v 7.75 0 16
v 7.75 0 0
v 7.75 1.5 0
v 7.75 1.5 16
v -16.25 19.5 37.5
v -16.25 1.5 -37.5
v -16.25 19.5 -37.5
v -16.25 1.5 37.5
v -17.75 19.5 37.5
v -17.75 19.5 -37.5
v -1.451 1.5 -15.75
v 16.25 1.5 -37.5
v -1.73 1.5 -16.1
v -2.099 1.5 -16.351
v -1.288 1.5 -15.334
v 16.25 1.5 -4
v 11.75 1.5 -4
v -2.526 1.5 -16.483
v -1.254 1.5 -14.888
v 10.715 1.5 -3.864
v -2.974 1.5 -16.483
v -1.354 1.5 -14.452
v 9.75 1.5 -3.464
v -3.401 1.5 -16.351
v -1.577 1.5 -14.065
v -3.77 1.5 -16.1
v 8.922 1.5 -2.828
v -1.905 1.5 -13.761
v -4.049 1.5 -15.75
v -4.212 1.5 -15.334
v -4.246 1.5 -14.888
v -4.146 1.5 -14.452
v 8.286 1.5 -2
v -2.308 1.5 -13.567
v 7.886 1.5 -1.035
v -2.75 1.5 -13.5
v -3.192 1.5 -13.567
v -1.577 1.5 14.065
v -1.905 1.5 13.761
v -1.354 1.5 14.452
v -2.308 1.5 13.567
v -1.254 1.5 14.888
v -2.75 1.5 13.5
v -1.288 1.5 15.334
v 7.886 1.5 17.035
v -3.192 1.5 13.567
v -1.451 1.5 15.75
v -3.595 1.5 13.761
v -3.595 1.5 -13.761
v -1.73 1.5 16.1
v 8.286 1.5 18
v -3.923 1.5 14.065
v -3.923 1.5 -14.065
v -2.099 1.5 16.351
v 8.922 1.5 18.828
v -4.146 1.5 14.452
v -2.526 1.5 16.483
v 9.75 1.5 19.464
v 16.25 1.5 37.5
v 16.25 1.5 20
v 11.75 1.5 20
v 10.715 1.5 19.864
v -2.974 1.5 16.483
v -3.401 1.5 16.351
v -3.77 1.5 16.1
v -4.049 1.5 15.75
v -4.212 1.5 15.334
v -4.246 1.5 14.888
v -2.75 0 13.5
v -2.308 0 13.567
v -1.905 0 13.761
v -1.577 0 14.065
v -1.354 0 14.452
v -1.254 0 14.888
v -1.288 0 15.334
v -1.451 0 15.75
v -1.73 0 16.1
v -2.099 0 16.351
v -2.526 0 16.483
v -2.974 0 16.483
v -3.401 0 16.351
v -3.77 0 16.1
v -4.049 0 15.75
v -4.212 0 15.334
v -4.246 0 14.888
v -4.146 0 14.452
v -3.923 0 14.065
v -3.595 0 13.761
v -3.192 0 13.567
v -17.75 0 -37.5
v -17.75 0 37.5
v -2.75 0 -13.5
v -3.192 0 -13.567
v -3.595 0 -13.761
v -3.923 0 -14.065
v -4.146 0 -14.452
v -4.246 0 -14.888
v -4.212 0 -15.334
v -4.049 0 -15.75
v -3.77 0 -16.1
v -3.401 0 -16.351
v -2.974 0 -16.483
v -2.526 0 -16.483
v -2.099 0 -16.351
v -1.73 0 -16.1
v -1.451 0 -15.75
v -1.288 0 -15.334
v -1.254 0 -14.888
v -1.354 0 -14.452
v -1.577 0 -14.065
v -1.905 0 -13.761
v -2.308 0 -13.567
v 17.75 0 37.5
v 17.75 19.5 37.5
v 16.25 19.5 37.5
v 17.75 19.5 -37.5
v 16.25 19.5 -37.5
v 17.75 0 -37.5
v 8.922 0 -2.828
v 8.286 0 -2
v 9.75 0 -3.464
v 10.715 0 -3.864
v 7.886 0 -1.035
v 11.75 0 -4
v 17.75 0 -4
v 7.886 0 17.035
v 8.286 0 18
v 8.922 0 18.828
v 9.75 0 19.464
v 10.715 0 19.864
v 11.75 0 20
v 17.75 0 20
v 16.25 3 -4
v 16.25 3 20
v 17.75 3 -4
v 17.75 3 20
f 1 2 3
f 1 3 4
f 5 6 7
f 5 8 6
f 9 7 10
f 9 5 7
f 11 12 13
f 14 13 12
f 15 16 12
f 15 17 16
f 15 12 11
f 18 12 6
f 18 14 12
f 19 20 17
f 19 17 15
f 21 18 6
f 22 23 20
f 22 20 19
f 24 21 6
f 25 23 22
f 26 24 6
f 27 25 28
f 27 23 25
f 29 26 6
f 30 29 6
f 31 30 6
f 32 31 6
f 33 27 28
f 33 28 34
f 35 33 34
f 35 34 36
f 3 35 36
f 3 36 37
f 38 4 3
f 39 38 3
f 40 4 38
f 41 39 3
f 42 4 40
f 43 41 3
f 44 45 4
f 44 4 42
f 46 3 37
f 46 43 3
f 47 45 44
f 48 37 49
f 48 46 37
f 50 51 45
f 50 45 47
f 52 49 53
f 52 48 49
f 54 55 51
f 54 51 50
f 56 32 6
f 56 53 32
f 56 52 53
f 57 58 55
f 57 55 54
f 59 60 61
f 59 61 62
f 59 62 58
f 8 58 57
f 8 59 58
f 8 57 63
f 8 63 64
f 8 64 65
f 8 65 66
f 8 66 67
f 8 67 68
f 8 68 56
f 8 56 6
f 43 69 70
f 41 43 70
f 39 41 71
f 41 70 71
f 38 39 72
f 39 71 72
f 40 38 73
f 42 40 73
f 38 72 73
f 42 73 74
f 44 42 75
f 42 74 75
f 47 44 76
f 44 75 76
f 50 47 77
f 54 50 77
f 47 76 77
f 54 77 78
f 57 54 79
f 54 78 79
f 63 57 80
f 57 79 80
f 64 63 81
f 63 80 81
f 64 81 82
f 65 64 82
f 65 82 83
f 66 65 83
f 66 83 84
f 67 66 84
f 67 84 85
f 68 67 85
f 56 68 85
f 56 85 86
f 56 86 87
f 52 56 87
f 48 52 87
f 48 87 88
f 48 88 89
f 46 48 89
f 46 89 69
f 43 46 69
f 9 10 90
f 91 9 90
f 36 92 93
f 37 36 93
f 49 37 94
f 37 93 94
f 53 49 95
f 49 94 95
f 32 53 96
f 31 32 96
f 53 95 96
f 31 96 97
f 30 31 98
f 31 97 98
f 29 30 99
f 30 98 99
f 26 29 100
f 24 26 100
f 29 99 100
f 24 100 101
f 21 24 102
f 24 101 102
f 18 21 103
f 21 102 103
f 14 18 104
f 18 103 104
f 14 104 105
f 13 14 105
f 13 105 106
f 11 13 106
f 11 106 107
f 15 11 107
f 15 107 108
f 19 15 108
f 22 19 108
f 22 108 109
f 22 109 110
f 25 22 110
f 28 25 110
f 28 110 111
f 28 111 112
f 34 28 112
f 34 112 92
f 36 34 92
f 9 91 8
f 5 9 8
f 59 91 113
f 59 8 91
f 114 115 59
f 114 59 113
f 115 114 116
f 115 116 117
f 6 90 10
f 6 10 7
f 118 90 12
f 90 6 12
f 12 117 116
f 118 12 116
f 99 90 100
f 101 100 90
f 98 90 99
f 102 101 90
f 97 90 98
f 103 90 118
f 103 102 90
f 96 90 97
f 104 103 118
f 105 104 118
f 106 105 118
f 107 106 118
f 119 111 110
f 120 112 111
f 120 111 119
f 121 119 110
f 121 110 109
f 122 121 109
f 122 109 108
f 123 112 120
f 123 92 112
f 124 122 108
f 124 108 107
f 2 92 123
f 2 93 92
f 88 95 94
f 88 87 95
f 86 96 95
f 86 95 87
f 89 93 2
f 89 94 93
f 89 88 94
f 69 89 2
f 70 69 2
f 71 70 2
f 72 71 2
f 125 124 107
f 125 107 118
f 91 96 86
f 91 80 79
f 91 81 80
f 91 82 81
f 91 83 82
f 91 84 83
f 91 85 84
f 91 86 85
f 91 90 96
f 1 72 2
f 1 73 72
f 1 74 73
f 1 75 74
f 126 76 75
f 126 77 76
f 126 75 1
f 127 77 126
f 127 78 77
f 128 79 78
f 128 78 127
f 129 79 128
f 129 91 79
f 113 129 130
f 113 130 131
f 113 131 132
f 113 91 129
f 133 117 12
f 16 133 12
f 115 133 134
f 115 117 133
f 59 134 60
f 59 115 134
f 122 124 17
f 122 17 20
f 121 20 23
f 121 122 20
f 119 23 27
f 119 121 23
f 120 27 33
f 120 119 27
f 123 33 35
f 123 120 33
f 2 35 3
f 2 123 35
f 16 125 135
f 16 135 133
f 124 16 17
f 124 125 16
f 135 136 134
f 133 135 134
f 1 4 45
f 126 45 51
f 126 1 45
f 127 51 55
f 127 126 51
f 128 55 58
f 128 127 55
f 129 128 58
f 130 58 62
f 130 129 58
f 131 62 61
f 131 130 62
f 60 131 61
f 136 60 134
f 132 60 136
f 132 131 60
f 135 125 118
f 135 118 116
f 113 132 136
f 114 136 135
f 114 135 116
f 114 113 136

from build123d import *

# Parameters (mm, degrees)
EXTRU_MINCE1_DEPTH      = 37.5
ESQUISSE2_R             = 1.5
ENL_V_MAT_EXTRU_1_DEPTH = 3


with BuildPart() as part:
    # Esquisse1 → Extru.-Mince1 (new, symmetric)
    with BuildSketch(Plane.XY):
        Polygon((-17.75, 19.5), (-17.75, 0), (17.75, 0), (17.75, 19.5), (16.25, 19.5), (16.25, 1.5), (-16.25, 1.5), (-16.25, 19.5), align=None)
    extrude(amount=EXTRU_MINCE1_DEPTH, both=True)

    # Esquisse2 → Enlèv. mat.-Extru.1 (cut)
    with BuildSketch(Plane.XZ):
        with Locations(Location((-2.75, 15, 0), (0, 0, 270))):
            Circle(ESQUISSE2_R)
        with Locations(Location((-2.75, -15, 0), (0, 0, 90))):
            Circle(ESQUISSE2_R)
        with BuildLine():
            Line((11.75, 20), (17.75, 20))
            Line((17.75, 20), (17.75, -4))
            Line((17.75, -4), (11.75, -4))
            ThreePointArc((11.75, -4), (8.921572875, -2.828427125), (7.75, 0))
            Line((7.75, 0), (7.75, 16))
            ThreePointArc((7.75, 16), (8.921572875, 18.828427125), (11.75, 20))
        make_face()
    extrude(amount=-ENL_V_MAT_EXTRU_1_DEPTH, mode=Mode.SUBTRACT)


solid = part.part
